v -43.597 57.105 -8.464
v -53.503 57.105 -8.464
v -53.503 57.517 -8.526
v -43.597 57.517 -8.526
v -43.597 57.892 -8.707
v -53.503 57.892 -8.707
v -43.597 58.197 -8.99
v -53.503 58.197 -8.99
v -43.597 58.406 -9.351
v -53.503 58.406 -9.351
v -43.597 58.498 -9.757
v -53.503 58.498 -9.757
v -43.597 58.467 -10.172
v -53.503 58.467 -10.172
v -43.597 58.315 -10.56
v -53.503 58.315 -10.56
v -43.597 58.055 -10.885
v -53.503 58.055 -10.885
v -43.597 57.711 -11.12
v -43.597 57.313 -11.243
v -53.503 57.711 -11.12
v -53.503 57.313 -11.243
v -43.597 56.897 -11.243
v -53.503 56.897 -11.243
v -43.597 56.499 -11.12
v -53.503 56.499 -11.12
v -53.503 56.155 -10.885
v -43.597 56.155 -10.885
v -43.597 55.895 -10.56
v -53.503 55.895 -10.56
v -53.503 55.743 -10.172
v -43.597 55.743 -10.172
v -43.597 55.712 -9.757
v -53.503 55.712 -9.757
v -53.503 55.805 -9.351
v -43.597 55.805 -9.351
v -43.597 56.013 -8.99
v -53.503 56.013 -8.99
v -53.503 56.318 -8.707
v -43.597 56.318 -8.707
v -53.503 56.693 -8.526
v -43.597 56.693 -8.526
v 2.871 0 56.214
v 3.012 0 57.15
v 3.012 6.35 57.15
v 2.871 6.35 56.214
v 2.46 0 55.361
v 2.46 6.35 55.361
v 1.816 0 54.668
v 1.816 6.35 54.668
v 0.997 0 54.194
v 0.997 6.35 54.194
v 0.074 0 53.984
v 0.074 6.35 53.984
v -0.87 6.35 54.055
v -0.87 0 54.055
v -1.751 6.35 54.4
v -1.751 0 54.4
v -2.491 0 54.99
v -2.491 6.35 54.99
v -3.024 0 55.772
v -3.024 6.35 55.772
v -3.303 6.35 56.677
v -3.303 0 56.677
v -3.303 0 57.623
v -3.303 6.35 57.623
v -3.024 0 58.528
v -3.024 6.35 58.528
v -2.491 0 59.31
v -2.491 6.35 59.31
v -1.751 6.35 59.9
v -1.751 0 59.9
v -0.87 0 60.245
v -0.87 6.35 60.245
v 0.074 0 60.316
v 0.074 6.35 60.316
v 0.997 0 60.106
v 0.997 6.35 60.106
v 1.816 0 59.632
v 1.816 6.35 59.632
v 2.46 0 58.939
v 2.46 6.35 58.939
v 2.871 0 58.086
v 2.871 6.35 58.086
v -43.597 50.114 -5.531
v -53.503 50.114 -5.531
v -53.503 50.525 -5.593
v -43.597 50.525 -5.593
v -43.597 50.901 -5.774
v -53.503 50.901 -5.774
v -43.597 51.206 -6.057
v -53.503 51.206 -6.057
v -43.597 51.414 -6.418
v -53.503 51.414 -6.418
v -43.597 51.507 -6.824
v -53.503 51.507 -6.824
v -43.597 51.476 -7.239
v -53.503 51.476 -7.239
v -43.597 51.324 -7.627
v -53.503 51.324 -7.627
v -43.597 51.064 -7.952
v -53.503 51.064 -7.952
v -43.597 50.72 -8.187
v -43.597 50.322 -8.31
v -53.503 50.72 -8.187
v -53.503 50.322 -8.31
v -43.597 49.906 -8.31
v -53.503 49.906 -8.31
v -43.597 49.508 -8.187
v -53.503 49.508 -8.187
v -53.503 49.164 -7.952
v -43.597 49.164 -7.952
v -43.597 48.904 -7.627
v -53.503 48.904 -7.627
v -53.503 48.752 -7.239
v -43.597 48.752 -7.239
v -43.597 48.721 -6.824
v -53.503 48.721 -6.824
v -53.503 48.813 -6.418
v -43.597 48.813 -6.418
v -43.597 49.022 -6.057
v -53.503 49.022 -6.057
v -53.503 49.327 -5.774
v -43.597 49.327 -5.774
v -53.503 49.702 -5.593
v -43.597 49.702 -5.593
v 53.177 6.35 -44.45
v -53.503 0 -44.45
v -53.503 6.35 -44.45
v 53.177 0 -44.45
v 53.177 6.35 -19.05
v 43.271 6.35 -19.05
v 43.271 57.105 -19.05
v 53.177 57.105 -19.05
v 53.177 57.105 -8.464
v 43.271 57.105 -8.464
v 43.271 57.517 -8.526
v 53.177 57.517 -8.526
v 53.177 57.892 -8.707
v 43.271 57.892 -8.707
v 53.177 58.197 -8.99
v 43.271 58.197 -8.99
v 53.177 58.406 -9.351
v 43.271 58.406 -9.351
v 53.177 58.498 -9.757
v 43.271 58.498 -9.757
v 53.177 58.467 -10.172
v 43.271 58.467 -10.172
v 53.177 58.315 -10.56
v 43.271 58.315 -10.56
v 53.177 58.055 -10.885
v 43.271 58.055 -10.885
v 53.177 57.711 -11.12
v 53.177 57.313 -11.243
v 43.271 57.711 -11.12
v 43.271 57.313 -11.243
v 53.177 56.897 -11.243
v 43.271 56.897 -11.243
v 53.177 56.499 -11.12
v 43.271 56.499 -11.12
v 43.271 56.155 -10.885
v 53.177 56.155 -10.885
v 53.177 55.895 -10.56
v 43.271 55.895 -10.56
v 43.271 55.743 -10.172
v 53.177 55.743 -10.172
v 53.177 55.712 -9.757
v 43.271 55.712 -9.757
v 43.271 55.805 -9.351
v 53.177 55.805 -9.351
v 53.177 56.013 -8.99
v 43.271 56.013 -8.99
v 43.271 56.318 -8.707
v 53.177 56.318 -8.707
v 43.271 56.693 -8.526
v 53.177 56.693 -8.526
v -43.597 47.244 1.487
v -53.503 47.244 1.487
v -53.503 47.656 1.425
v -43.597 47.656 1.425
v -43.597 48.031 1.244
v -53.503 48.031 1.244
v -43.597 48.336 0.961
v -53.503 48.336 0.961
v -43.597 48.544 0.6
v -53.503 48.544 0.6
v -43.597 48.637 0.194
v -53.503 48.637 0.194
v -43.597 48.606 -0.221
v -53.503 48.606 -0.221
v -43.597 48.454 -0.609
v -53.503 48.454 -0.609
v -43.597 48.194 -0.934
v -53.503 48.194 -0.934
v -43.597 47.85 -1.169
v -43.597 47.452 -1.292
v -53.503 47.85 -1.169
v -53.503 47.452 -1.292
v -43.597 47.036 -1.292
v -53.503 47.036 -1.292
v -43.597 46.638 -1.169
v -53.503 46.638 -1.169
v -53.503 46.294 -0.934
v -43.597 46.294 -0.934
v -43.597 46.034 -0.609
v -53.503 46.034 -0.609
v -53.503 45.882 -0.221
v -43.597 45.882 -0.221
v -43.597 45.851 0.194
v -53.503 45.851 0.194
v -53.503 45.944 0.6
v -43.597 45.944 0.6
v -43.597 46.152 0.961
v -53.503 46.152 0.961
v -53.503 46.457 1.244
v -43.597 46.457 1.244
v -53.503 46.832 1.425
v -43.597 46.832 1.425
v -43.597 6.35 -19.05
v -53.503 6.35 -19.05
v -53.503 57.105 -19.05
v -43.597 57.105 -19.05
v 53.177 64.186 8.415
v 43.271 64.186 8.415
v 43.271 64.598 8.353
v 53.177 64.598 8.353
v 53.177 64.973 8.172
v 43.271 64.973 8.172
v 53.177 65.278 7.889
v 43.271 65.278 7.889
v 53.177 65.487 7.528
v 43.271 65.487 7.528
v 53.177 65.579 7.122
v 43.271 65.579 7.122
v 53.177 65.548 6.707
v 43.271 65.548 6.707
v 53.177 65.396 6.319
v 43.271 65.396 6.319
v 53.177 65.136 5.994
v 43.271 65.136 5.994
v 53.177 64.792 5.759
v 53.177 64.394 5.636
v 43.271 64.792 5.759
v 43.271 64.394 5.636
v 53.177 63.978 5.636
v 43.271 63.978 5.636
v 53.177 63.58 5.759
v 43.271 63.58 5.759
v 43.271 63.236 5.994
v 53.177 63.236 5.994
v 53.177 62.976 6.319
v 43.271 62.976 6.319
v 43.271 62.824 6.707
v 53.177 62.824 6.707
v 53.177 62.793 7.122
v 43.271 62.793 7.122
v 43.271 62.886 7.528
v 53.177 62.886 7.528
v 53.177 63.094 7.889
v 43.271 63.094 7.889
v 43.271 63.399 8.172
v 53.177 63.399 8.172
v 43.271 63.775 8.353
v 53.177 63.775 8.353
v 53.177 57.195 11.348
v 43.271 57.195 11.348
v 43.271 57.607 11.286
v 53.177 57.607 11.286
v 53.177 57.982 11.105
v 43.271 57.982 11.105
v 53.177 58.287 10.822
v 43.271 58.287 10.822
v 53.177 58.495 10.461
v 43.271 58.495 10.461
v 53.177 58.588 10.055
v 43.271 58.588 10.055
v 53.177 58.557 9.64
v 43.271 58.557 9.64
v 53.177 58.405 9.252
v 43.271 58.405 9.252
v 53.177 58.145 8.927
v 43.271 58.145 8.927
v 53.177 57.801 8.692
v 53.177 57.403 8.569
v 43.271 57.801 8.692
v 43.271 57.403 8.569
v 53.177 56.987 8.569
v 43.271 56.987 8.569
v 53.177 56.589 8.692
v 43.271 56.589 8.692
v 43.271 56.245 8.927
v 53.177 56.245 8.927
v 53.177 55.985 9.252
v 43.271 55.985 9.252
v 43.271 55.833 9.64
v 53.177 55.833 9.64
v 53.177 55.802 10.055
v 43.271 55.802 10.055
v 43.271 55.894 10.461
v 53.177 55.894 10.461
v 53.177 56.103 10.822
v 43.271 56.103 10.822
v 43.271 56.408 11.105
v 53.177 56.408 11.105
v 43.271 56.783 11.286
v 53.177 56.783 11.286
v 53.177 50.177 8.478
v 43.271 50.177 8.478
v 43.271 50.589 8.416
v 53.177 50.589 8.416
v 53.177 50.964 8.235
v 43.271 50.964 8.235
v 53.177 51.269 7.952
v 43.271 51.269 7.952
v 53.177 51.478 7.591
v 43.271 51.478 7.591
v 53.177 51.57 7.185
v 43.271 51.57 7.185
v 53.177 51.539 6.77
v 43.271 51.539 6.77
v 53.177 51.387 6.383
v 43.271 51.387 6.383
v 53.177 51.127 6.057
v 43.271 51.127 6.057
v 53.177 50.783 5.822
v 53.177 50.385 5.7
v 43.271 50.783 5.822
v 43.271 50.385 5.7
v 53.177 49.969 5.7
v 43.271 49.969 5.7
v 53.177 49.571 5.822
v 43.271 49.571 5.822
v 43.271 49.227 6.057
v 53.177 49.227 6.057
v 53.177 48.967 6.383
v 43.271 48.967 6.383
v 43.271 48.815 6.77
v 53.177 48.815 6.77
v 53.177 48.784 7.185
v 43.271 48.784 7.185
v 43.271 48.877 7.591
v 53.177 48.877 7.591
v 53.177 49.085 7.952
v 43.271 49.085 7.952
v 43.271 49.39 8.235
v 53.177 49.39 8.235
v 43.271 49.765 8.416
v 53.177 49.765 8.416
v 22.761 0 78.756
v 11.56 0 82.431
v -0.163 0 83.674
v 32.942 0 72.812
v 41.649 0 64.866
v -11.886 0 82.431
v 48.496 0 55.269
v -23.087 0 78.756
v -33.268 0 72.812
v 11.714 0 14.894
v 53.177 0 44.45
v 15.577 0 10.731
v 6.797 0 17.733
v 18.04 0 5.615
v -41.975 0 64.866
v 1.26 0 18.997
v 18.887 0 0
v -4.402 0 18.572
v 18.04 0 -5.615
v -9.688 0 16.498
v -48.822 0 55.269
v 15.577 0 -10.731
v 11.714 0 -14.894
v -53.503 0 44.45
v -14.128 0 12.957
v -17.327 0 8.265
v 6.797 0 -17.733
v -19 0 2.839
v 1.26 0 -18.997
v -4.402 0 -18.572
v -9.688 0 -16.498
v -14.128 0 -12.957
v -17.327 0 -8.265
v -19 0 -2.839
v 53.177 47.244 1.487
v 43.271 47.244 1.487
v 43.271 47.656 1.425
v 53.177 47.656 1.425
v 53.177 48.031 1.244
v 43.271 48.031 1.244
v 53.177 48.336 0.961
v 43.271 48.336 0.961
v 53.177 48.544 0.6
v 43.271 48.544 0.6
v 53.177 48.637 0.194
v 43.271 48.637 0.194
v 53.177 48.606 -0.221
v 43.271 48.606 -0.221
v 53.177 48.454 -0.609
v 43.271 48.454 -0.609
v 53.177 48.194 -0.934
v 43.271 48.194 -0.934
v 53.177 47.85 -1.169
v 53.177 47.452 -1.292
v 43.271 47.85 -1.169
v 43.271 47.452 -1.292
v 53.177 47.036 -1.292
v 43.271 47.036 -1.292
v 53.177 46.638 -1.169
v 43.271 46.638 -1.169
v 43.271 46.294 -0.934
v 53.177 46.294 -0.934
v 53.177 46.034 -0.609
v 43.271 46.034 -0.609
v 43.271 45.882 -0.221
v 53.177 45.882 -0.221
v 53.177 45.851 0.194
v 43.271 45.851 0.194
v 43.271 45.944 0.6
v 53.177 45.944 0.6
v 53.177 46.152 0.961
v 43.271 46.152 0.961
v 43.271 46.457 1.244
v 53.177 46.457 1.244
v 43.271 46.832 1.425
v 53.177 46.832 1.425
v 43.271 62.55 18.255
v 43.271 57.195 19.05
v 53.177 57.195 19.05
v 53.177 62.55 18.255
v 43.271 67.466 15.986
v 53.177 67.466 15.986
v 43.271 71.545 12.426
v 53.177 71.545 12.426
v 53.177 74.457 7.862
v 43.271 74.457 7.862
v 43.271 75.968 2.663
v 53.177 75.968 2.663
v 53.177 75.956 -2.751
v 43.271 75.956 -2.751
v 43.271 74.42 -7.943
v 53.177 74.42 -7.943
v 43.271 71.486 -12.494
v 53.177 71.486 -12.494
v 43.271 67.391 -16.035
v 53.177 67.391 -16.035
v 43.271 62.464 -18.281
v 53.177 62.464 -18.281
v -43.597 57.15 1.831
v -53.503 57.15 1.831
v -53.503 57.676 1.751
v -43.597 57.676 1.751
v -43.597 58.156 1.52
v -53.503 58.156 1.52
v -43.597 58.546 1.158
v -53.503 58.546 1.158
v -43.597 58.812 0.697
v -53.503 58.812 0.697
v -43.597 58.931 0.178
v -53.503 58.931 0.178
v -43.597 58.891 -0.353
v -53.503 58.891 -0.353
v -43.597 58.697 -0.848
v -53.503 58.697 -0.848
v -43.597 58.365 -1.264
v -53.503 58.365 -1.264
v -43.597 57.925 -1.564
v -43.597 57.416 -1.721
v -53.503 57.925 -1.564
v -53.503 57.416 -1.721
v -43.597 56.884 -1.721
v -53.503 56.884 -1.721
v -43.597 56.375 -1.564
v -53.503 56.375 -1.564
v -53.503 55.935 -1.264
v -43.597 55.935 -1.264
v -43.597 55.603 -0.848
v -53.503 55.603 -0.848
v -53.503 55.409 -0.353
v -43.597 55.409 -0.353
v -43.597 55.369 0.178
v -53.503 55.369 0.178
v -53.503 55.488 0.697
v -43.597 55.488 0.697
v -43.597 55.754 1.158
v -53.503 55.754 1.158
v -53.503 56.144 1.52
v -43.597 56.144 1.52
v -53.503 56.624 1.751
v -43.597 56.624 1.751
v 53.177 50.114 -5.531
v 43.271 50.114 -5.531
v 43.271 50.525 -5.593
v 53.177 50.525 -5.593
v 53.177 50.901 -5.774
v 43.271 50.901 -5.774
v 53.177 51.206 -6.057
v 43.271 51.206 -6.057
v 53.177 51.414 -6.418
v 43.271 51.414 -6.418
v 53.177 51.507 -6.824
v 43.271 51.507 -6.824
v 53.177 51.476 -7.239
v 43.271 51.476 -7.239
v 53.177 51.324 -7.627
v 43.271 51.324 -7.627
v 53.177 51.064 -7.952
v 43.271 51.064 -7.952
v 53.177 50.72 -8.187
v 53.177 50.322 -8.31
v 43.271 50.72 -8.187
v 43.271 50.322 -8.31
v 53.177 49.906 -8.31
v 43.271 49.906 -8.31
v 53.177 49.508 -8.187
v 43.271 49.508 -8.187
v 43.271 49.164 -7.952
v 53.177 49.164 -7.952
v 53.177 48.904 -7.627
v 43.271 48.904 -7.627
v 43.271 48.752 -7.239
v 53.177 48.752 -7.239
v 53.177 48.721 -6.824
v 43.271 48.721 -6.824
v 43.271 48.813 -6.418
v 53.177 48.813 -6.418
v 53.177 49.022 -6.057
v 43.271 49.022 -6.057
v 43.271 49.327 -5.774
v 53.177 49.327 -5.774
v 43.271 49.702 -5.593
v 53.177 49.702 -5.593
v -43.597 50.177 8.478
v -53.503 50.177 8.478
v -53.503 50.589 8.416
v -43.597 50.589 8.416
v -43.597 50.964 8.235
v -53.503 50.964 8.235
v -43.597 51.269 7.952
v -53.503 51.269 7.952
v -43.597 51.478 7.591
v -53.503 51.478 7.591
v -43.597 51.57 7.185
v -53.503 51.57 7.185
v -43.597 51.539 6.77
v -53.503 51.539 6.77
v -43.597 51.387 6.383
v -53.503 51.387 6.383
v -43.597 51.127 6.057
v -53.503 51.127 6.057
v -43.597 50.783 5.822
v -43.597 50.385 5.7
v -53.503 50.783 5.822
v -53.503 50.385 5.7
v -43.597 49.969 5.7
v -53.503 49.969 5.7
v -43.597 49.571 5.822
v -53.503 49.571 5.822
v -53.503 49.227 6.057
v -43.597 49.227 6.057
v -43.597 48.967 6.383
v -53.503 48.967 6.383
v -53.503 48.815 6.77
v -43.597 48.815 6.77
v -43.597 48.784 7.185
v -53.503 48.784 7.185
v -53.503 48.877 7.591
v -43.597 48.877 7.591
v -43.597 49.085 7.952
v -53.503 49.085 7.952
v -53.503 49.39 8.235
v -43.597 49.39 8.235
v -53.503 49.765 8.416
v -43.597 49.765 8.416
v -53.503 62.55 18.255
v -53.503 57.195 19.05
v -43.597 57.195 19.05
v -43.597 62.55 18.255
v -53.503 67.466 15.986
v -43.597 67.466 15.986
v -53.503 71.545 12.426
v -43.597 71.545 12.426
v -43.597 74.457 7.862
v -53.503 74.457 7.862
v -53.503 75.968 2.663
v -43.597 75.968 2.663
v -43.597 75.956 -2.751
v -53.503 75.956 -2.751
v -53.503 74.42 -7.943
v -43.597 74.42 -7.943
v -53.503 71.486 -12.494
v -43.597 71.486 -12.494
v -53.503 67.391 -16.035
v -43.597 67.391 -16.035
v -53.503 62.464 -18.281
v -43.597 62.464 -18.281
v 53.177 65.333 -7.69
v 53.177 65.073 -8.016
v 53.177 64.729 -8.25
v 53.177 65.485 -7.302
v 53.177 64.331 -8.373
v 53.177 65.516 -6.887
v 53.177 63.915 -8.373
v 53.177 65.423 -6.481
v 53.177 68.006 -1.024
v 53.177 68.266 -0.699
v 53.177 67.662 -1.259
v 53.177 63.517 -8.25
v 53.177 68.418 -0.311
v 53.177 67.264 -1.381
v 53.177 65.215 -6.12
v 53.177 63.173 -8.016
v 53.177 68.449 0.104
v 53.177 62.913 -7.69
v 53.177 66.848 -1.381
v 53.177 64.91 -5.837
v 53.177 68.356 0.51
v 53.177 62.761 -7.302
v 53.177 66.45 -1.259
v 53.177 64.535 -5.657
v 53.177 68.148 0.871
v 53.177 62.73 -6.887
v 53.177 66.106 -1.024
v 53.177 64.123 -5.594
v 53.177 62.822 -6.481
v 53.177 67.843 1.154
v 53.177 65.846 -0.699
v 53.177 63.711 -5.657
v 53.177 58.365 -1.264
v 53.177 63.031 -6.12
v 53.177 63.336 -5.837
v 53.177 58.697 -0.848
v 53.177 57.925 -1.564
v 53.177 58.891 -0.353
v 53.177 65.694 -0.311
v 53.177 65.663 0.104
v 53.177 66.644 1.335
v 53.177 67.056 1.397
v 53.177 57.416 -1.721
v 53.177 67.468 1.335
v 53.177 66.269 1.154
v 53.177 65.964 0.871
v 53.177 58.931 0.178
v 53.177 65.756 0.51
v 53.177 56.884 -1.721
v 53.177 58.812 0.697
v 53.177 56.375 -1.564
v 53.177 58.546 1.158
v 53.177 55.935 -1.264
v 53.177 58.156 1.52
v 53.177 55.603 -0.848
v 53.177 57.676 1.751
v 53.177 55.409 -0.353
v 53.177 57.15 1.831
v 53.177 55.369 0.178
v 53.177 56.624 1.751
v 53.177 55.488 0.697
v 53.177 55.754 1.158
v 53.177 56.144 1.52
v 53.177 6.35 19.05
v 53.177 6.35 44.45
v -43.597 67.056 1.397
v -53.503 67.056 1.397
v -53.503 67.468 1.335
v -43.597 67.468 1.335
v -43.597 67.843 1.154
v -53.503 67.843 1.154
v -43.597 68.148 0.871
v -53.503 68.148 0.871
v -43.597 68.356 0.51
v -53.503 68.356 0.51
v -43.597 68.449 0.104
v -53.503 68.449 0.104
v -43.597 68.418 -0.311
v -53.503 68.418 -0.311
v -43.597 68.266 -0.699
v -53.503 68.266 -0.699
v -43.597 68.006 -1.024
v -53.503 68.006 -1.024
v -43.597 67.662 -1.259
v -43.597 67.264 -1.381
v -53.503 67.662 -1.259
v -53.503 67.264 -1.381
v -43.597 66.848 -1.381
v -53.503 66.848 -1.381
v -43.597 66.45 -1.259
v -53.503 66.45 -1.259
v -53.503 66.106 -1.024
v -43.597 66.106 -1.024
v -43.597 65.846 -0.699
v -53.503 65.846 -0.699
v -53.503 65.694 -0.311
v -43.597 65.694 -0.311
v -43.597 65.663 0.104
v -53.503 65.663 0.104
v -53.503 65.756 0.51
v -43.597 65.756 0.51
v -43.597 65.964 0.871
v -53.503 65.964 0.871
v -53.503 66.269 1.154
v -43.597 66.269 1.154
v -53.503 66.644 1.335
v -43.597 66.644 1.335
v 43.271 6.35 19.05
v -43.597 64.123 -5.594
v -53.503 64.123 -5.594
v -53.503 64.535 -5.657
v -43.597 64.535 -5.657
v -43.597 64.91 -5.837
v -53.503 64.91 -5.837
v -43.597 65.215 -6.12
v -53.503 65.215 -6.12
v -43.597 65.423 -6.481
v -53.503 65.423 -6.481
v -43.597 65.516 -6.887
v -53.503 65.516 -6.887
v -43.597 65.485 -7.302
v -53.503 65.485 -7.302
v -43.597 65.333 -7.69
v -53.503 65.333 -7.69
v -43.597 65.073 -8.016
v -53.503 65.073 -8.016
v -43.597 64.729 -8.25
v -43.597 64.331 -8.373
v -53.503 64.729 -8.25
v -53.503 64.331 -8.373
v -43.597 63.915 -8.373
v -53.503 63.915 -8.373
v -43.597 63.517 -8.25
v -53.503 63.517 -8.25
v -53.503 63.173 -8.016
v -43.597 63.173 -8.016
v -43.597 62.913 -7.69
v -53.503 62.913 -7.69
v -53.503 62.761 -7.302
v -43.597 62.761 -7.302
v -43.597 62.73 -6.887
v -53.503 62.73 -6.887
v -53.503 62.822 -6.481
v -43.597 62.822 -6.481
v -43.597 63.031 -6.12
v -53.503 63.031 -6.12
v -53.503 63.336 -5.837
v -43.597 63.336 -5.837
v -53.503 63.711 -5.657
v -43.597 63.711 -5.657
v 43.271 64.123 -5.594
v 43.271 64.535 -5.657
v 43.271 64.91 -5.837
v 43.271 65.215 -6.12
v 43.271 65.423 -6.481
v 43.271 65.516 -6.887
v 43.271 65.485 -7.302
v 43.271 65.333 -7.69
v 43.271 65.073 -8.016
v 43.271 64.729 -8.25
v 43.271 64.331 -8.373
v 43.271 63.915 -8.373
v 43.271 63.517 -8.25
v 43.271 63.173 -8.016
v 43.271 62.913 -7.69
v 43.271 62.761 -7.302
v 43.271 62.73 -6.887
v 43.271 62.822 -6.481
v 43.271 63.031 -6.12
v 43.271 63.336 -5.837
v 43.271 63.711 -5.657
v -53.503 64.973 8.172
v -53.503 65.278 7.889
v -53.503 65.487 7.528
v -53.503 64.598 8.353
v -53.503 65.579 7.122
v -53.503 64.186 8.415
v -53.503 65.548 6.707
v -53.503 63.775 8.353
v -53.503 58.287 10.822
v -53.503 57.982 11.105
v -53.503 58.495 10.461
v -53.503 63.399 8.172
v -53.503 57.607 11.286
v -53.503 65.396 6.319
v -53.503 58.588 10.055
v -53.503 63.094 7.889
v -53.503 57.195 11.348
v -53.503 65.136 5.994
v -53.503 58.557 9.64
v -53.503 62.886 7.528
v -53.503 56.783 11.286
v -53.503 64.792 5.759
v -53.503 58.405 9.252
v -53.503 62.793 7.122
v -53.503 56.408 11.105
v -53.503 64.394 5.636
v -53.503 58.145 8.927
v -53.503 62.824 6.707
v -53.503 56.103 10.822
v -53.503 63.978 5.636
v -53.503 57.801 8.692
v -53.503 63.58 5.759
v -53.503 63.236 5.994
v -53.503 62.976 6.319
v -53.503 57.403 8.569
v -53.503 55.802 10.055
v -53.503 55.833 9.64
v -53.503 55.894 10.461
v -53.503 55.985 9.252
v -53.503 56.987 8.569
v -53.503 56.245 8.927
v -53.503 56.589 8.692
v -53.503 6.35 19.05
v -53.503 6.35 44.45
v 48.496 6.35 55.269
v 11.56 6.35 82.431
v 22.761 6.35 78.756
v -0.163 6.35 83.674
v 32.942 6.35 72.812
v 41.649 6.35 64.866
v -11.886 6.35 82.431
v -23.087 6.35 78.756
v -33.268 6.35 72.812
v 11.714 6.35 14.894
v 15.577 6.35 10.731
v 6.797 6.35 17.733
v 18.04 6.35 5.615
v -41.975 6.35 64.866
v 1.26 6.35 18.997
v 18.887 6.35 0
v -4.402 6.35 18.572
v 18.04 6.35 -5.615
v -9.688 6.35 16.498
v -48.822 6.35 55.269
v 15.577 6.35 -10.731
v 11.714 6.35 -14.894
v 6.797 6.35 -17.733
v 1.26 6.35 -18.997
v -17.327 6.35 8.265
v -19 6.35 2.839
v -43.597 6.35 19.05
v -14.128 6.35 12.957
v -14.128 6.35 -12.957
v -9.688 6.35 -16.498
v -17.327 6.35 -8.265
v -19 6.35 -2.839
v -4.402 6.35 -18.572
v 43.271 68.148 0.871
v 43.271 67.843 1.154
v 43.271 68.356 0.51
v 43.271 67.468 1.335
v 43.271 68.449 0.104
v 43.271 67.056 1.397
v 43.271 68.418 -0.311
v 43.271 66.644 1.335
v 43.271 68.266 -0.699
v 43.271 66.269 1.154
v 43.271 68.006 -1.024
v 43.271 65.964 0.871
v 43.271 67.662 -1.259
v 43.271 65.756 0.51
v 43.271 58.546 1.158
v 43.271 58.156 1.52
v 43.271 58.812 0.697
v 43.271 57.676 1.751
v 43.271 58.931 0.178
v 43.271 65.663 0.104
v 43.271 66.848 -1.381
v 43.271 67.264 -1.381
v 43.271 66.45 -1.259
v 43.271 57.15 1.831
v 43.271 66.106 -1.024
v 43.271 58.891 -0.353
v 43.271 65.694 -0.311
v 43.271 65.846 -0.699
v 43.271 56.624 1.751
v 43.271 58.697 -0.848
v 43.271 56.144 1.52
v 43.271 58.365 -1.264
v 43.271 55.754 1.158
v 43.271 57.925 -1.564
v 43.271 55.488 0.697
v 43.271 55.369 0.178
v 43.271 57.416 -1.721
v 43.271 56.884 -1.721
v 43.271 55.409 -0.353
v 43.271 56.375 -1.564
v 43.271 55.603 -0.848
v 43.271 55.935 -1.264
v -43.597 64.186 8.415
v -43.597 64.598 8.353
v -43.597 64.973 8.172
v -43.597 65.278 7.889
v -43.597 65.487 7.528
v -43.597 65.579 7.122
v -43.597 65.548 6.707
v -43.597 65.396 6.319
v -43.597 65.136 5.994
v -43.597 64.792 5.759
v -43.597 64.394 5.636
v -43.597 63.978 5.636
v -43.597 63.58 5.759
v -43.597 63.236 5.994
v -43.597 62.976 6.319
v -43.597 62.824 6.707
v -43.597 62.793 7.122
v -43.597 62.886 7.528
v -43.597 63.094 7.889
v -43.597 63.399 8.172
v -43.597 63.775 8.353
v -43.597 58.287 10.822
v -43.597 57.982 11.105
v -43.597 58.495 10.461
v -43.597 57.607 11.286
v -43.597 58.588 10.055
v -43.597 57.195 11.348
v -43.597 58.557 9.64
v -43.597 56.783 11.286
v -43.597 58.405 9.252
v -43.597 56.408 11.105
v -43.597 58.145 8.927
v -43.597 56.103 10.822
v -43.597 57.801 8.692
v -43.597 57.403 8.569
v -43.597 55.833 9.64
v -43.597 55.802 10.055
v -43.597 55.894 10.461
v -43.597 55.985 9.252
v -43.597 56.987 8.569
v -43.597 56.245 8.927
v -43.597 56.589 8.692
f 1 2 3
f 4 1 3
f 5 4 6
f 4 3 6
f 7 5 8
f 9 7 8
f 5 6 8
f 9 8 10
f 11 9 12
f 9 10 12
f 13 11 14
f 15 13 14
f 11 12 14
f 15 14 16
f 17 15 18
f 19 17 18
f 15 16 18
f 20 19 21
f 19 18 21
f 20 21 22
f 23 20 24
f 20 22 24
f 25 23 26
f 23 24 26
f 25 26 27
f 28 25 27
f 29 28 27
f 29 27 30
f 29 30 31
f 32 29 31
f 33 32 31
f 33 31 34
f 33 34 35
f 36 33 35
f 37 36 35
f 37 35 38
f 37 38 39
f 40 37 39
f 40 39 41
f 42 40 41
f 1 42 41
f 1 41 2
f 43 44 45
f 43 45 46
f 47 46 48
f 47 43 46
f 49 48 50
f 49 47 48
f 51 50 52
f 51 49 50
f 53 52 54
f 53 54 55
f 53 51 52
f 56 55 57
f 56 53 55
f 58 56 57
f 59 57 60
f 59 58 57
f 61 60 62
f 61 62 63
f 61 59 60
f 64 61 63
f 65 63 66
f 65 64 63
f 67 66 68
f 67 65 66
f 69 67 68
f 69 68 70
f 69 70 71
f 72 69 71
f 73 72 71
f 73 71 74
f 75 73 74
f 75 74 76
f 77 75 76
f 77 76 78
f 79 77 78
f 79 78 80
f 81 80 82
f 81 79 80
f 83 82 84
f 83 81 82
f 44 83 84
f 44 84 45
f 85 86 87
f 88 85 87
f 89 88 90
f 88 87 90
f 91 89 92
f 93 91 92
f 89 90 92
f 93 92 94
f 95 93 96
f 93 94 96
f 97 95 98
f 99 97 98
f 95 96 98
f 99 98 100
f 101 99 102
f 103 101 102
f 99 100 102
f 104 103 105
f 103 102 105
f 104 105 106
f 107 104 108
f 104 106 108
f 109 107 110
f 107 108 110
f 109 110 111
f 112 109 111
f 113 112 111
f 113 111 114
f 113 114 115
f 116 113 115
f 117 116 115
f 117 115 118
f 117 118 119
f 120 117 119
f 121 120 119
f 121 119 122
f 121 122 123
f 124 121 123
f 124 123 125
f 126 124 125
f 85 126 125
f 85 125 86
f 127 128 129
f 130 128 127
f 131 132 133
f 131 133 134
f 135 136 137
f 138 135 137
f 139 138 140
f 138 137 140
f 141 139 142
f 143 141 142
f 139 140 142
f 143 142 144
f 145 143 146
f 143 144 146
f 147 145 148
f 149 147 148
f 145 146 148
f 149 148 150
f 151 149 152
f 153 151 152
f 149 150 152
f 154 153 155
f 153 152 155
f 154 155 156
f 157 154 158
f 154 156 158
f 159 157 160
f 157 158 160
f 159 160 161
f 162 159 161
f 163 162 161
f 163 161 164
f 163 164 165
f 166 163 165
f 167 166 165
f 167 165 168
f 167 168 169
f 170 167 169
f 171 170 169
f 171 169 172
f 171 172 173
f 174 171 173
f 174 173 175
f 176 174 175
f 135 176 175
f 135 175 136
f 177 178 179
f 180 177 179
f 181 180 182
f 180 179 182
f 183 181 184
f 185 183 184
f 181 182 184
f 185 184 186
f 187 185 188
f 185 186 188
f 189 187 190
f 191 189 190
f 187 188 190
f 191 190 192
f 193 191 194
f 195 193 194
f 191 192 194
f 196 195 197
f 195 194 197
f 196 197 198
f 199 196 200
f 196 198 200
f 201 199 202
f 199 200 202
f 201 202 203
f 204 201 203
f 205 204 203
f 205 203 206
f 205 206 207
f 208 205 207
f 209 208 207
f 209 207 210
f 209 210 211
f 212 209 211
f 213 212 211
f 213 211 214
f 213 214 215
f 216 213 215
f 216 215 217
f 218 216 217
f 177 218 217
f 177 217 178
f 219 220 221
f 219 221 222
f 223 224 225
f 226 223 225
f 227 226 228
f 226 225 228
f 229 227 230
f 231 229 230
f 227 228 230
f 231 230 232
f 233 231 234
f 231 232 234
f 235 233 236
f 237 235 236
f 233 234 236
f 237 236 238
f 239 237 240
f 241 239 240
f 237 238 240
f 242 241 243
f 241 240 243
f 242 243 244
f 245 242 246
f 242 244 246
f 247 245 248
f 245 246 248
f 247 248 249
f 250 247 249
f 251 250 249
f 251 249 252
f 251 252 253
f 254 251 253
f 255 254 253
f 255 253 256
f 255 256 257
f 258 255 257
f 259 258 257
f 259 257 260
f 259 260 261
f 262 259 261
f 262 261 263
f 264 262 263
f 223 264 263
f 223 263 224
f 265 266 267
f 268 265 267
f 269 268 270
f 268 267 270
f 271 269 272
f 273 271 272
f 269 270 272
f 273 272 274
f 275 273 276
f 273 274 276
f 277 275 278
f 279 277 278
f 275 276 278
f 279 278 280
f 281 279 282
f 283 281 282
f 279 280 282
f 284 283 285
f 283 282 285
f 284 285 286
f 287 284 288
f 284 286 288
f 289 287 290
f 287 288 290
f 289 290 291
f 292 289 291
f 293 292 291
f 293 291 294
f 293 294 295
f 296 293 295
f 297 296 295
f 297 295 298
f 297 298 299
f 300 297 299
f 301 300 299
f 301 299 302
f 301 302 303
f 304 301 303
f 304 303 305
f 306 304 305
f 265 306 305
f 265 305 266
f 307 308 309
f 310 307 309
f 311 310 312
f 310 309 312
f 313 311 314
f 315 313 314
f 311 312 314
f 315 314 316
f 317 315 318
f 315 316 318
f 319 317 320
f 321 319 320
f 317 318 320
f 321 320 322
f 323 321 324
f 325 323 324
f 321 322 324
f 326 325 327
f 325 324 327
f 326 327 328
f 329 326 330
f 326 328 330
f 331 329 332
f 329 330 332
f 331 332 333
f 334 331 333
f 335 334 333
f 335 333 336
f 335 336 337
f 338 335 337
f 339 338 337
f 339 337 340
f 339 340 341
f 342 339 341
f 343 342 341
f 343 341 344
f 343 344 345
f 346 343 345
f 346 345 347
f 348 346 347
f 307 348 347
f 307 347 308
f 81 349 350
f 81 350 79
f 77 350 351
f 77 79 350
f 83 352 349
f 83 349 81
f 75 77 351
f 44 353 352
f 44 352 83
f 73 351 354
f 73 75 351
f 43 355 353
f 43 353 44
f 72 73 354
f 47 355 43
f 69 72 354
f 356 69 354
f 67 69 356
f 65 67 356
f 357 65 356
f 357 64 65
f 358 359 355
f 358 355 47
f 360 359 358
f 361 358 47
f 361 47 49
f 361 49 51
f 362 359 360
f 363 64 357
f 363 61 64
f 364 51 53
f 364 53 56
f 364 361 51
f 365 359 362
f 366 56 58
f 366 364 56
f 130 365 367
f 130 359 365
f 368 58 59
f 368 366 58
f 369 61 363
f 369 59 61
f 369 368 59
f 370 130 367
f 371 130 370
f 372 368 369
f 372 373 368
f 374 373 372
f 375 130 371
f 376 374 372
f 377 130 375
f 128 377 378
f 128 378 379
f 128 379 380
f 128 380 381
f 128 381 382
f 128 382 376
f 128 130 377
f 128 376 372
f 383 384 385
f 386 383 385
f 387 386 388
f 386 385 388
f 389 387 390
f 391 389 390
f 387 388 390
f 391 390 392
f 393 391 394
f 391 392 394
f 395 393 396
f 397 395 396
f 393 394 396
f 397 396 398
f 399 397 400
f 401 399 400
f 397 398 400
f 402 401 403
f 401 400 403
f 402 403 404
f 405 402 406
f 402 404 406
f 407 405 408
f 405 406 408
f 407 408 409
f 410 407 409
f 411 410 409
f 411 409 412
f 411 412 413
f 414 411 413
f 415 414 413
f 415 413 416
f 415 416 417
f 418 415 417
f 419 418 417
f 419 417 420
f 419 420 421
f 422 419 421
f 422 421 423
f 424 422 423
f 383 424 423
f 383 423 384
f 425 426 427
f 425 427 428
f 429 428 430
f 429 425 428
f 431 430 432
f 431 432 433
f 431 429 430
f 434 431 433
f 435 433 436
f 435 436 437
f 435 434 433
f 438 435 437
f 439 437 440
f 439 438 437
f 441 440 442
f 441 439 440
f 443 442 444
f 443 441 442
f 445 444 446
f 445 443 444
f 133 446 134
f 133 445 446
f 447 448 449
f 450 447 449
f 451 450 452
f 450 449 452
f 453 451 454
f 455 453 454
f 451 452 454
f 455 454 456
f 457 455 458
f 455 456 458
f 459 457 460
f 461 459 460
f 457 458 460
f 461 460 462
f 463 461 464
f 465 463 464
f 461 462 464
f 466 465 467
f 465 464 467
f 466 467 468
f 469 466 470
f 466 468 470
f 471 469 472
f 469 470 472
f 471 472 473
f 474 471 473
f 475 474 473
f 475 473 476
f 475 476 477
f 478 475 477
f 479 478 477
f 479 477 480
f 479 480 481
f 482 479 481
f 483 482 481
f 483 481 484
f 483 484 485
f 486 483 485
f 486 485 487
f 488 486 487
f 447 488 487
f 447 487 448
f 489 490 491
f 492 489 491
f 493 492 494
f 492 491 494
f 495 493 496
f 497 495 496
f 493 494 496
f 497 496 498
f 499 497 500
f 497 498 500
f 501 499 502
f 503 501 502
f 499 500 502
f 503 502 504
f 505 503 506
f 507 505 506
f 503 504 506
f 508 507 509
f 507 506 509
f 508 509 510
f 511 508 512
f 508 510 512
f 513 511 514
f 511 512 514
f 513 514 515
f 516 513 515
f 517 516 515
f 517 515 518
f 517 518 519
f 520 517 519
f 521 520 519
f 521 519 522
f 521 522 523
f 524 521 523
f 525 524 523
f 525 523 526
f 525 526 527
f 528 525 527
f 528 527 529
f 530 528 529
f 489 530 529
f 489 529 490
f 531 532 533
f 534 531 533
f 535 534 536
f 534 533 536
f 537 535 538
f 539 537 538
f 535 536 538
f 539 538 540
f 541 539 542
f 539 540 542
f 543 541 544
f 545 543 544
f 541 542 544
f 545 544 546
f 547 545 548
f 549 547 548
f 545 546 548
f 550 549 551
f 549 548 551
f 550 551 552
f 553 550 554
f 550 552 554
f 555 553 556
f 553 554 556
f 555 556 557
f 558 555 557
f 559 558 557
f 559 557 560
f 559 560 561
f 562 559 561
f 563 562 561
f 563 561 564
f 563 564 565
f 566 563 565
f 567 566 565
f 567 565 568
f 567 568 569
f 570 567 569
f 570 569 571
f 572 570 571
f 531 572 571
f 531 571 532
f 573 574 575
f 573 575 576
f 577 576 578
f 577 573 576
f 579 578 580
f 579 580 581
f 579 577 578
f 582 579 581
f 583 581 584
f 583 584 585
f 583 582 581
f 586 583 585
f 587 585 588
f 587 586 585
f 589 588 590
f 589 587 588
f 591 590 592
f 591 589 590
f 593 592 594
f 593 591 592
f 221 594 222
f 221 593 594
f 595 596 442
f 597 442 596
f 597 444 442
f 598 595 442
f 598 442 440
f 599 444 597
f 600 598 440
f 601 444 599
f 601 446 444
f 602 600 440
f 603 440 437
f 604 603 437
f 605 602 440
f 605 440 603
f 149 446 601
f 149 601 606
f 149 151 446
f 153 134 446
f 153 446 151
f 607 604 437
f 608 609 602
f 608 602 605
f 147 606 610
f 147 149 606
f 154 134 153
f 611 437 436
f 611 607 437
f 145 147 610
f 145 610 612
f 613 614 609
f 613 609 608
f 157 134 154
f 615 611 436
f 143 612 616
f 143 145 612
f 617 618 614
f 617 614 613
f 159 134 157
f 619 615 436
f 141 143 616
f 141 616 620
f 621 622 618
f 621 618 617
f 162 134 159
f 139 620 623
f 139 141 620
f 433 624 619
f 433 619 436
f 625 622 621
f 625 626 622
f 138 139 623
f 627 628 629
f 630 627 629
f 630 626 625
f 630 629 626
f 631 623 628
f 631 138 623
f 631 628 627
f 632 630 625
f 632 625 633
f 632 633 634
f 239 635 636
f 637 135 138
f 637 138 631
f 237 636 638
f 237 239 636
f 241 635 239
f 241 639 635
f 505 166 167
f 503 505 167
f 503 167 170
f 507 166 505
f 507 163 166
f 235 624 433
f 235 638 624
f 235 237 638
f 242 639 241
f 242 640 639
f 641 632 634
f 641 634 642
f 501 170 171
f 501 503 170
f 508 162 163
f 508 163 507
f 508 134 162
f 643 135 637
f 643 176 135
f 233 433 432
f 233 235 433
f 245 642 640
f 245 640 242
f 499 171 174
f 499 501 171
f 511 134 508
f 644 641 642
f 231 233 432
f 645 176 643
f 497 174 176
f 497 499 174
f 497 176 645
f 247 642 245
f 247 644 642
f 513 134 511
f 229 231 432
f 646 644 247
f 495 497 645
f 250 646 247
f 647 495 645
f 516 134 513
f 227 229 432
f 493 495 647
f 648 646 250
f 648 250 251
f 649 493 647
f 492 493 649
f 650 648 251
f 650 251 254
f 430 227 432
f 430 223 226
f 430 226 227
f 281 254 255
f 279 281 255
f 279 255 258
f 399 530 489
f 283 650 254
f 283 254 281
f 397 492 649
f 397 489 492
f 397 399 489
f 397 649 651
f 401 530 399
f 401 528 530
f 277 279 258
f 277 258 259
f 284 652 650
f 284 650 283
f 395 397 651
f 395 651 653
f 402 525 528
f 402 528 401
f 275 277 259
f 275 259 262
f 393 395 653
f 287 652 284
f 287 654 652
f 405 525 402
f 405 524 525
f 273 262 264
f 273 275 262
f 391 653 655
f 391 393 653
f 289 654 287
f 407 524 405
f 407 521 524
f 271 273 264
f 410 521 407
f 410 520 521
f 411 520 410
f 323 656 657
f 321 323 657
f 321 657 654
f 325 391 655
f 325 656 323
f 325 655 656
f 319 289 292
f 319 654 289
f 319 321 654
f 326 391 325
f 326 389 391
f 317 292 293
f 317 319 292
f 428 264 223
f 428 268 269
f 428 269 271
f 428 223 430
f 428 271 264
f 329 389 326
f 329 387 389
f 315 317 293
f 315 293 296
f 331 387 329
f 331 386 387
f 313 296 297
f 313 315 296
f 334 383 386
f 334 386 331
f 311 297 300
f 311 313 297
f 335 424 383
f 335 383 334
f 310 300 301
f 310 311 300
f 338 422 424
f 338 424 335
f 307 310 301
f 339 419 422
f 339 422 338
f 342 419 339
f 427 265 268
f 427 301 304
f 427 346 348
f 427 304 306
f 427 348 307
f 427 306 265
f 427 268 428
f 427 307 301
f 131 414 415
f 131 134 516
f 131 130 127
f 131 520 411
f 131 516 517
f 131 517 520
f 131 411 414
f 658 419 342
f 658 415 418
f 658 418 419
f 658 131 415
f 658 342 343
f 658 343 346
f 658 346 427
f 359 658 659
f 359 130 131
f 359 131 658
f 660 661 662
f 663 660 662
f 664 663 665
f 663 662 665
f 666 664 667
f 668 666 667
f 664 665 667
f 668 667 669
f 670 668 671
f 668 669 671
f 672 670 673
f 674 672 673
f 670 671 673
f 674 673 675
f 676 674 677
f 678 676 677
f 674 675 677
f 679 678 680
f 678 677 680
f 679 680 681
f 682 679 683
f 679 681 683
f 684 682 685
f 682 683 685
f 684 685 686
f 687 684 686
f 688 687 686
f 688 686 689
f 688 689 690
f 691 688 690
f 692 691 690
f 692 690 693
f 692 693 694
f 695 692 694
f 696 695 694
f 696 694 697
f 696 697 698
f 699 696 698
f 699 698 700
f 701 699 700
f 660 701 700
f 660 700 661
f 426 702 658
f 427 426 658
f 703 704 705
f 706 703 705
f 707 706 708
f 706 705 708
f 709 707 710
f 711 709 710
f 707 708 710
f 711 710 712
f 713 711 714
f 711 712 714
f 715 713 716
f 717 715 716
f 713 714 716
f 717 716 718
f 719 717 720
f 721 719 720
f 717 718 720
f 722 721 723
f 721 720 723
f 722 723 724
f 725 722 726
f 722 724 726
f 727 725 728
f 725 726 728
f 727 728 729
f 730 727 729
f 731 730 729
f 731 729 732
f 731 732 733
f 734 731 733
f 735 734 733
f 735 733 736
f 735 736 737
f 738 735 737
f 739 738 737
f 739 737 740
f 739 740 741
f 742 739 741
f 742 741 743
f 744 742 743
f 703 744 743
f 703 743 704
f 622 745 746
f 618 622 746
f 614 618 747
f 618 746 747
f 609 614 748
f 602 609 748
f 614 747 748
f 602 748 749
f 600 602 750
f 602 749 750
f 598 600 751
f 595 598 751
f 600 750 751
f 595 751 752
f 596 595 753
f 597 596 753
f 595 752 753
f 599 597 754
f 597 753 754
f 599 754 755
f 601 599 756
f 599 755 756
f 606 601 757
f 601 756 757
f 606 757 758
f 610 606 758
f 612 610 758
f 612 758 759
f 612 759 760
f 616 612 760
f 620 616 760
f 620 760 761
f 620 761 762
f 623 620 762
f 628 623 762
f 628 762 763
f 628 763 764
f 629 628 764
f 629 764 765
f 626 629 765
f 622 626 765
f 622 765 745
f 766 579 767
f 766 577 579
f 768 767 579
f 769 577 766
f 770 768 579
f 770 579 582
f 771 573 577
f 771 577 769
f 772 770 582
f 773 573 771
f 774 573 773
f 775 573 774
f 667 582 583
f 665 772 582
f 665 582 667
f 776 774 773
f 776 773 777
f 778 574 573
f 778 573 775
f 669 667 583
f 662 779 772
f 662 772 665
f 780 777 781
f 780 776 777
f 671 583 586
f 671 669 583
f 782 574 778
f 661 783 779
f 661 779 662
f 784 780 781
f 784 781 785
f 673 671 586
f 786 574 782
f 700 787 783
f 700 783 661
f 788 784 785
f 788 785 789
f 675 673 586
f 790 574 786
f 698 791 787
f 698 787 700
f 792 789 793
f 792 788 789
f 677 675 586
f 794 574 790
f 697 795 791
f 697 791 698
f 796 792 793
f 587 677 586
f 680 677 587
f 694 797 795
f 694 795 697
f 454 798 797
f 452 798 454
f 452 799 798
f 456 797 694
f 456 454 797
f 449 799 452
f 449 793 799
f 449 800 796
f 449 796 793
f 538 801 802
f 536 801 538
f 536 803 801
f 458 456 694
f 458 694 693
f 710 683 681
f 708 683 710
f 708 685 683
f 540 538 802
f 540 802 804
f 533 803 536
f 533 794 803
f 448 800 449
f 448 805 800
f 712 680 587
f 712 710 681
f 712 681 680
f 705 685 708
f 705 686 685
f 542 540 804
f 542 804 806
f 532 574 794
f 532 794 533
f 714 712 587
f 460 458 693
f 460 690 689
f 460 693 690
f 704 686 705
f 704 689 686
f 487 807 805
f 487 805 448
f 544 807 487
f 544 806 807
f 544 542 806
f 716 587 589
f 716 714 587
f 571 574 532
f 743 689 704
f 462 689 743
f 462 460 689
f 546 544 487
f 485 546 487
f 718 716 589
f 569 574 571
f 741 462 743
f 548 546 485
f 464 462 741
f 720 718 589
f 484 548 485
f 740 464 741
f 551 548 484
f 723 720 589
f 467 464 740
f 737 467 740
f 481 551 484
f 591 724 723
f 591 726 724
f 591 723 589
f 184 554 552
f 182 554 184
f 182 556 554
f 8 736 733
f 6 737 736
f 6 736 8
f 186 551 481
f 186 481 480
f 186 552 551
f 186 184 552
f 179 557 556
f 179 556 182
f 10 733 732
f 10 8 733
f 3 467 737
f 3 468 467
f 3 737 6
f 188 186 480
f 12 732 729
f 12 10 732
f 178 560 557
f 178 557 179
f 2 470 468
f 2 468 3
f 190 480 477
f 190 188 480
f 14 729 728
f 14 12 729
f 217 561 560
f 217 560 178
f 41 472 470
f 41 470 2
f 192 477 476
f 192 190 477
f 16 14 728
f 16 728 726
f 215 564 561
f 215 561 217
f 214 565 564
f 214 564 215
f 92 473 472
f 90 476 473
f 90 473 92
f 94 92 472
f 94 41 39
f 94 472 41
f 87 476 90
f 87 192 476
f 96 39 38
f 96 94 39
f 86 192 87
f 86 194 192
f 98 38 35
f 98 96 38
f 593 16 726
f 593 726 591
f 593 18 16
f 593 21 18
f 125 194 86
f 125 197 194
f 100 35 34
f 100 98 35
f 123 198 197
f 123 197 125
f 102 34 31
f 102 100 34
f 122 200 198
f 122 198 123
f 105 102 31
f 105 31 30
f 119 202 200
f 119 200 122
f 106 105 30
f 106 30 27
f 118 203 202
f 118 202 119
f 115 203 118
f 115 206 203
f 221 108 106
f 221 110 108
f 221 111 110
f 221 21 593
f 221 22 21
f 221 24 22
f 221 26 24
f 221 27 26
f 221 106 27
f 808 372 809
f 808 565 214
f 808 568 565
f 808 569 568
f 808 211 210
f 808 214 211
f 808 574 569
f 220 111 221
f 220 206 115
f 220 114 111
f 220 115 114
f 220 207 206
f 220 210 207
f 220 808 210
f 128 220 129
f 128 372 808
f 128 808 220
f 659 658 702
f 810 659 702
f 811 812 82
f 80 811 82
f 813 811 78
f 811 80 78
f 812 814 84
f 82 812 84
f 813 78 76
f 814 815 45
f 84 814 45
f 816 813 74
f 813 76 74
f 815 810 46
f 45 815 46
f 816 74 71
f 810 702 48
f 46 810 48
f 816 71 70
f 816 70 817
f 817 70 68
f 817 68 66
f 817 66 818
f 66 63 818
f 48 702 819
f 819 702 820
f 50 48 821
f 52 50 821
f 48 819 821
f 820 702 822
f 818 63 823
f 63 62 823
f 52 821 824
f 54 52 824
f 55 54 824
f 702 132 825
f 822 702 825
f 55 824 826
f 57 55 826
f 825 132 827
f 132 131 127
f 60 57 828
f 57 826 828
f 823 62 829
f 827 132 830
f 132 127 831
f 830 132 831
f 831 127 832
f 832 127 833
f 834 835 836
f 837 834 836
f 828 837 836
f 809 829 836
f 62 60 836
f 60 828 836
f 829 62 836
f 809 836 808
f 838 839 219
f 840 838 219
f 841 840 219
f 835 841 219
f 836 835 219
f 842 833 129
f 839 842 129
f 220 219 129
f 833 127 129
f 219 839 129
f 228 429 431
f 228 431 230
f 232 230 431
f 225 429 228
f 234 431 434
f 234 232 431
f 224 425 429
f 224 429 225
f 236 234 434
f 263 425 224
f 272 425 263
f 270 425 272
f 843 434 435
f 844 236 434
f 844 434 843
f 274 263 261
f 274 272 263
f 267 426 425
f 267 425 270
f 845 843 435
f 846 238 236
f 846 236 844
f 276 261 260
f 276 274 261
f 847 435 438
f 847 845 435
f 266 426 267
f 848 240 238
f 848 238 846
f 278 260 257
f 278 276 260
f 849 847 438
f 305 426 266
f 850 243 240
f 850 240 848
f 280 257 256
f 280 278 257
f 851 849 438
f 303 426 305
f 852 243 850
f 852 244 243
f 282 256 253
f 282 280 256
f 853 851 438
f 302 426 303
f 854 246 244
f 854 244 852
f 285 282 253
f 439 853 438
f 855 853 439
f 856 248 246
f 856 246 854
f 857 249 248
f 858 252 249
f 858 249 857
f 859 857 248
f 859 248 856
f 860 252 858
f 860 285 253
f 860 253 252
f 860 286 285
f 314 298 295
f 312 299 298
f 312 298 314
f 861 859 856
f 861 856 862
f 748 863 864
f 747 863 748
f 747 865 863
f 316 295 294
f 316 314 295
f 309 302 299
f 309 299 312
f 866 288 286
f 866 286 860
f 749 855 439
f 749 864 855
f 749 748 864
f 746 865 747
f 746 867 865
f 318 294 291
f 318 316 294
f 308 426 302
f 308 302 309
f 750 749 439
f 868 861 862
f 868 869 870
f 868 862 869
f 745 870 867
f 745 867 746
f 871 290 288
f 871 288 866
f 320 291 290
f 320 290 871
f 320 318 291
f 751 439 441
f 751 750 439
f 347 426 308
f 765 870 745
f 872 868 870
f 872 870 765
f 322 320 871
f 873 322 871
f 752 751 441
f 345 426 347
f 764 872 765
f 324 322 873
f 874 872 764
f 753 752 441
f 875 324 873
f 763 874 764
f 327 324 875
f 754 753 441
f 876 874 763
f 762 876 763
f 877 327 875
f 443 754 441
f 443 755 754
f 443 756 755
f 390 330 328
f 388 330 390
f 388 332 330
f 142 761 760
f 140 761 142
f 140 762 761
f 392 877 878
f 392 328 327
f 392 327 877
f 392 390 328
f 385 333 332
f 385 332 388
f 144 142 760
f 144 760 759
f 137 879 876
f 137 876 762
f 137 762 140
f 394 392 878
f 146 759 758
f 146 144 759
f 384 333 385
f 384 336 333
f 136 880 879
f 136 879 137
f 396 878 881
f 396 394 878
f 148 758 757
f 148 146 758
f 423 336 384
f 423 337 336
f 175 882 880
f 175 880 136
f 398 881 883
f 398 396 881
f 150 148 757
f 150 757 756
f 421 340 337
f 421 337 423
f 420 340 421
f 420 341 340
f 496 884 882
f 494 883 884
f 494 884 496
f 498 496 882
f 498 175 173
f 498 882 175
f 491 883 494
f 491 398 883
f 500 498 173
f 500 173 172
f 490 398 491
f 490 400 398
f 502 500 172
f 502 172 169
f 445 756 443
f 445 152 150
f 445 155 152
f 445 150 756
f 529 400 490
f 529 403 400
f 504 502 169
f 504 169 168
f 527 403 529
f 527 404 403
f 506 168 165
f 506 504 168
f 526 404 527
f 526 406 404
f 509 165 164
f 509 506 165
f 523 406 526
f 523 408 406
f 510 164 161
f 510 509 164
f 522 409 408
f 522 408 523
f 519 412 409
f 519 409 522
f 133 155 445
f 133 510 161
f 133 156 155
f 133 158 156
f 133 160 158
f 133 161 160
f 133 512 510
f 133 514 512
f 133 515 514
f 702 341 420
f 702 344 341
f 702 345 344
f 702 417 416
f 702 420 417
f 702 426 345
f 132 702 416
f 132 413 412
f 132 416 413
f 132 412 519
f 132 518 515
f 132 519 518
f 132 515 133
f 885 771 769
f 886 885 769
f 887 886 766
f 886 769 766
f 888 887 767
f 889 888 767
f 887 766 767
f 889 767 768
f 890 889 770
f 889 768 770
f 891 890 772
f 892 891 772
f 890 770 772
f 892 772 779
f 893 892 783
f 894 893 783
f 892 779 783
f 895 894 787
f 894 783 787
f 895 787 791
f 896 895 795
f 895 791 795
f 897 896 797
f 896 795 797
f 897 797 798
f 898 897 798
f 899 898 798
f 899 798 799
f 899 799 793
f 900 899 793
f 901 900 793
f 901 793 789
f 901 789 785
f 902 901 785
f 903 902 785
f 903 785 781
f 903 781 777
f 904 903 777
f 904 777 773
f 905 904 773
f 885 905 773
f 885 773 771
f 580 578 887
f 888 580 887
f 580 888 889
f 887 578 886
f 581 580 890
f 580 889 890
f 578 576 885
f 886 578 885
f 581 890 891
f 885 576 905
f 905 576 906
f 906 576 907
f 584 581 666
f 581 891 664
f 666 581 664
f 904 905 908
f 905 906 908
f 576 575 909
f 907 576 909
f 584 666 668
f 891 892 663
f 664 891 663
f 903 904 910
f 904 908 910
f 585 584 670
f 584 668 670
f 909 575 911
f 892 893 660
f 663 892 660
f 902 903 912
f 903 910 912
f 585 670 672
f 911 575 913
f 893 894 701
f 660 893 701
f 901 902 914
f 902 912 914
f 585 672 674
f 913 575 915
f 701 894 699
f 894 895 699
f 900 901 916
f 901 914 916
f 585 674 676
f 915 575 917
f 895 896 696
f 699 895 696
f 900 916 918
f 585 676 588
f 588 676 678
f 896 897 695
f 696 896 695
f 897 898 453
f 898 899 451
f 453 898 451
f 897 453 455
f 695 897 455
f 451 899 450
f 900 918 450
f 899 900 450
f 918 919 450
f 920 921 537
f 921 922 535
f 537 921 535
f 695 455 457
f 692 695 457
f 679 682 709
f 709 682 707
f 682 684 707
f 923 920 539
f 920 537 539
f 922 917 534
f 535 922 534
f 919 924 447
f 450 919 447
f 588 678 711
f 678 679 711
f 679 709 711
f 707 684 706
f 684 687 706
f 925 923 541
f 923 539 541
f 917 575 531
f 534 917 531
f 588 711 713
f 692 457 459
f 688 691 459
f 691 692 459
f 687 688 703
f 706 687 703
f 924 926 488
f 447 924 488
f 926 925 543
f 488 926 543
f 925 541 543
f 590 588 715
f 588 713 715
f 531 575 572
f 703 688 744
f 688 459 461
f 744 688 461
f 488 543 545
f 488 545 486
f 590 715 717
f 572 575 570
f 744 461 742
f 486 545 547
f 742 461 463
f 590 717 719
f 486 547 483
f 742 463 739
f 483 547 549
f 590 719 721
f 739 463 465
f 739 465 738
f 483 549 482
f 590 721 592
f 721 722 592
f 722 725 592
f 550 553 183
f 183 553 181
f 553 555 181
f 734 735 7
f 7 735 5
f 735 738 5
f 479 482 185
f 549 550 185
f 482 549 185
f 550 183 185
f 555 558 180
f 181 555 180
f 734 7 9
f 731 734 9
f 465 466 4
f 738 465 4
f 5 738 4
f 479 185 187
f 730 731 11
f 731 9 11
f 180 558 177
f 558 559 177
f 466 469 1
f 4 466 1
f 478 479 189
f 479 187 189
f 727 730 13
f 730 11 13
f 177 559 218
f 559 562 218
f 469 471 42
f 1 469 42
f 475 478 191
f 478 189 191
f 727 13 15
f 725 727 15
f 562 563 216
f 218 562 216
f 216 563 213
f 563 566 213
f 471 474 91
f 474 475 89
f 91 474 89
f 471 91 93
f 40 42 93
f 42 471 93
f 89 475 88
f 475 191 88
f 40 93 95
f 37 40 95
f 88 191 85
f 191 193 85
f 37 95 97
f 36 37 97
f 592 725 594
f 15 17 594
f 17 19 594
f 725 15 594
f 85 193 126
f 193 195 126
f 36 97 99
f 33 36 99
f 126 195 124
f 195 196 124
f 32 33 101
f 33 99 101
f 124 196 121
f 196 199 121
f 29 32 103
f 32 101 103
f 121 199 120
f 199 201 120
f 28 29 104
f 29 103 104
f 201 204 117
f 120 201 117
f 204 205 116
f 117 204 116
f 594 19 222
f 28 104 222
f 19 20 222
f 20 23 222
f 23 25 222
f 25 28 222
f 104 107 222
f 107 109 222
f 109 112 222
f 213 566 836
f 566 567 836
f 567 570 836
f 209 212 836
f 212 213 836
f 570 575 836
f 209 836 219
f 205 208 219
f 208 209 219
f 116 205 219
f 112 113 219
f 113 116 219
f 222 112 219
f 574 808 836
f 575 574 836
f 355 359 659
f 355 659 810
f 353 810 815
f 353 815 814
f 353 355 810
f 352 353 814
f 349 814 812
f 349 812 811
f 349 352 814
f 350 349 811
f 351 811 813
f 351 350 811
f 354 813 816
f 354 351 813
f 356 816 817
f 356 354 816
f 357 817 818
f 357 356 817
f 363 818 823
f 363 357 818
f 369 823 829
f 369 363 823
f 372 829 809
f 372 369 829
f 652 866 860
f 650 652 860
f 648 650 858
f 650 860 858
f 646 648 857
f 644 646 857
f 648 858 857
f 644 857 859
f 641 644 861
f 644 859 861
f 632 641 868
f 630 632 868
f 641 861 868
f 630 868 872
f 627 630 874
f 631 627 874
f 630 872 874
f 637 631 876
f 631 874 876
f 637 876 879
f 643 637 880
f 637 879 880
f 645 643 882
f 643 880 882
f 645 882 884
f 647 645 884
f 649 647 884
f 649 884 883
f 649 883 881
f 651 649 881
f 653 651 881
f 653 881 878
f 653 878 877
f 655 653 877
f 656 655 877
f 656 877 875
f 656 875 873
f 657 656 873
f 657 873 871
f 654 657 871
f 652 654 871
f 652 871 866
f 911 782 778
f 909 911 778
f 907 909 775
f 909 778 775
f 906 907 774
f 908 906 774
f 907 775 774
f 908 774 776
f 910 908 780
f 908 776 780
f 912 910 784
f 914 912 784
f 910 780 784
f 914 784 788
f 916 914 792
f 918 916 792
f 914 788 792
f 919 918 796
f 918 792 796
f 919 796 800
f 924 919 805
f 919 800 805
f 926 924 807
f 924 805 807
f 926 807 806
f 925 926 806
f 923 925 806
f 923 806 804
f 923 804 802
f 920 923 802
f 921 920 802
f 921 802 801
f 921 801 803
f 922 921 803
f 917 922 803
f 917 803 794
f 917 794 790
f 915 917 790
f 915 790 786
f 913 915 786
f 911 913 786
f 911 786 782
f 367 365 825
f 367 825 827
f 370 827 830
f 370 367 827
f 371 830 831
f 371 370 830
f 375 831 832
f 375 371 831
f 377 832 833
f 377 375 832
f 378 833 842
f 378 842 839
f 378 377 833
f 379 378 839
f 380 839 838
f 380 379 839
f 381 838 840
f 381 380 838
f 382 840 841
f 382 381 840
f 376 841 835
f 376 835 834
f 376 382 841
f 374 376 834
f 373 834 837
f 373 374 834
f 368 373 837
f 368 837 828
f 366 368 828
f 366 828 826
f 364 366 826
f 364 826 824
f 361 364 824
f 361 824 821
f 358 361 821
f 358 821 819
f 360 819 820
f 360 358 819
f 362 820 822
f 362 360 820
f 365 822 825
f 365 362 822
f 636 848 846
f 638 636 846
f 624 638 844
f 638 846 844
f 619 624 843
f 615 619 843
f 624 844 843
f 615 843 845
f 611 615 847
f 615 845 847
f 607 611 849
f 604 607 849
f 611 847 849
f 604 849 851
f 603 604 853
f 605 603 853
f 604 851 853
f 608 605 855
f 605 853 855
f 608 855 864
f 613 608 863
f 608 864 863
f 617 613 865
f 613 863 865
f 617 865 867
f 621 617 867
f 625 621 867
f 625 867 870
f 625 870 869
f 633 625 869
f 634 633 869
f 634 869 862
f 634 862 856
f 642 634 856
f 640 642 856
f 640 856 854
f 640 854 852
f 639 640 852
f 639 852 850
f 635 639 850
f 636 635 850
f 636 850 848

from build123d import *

# Parameters (mm, degrees)
SKETCH1_R           = 19.05
SKETCH1_R_2         = 3.175
BOSS_EXTRUDE1_DEPTH = 6.35
SKETCH6_W           = 9.906
SKETCH6_H           = 38.1
BOSS_EXTRUDE2_DEPTH = 76.2
SKETCH7_R           = 1.397
SKETCH7_R_2         = 1.7859375
CUT_EXTRUDE1_DEPTH  = 107.68


with BuildPart() as part:
    # Sketch1 → Boss-Extrude1 (new body)
    with BuildSketch(Plane(origin=(0, 0, 0), x_dir=(1, 0, 0), z_dir=(0, 1, 0))):
        with BuildLine():
            Line((-53.503176773, 44.45), (53.176823227, 44.45))
            Line((53.176823227, 44.45), (53.176823227, -44.45))
            ThreePointArc((53.176823227, -44.45), (-0.163176773, -83.674106148), (-53.503176773, -44.45))
            Line((-53.503176773, -44.45), (-53.503176773, 44.45))
        make_face()
        with Locations((-0.163176773, 0)):
            Circle(SKETCH1_R, mode=Mode.SUBTRACT)
        with Locations((-0.163176773, -57.15)):
            Circle(SKETCH1_R_2, mode=Mode.SUBTRACT)
    extrude(amount=BOSS_EXTRUDE1_DEPTH)

    # Sketch6 → Boss-Extrude2 (add)
    with BuildSketch(Plane(origin=(0, 6.35, 0), x_dir=(1, 0, 0), z_dir=(0, 1, 0))):
        with Locations((-48.550176773, 0)):
            Rectangle(SKETCH6_W, SKETCH6_H)
        with Locations((48.223823227, 0)):
            Rectangle(SKETCH6_W, SKETCH6_H)
    extrude(amount=BOSS_EXTRUDE2_DEPTH)

    # Sketch7 → Cut-Extrude1 (cut, through all)
    with BuildSketch(Plane.ZY.offset(53.503176773)):
        with Locations((-6.991480211, 64.122926346)):
            Circle(SKETCH7_R)
        with Locations((0, 67.056)):
            Circle(SKETCH7_R)
        with Locations((7.017719338, 64.186273203)):
            Circle(SKETCH7_R)
        with Locations((9.950792993, 57.194792993)):
            Circle(SKETCH7_R)
        with Locations((7.081066196, 50.177073654)):
            Circle(SKETCH7_R)
        with Locations((0.089585985, 47.244)):
            Circle(SKETCH7_R)
        with Locations((-6.928133353, 50.113726797)):
            Circle(SKETCH7_R)
        with Locations((-9.861207007, 57.105207007)):
            Circle(SKETCH7_R)
        with Locations((0.044792993, 57.15)):
            Circle(SKETCH7_R_2)
        with BuildLine():
            Line((-19.05, 57.105207007), (-19.05, 82.55))
            Line((-19.05, 82.55), (19.05, 82.55))
            Line((19.05, 82.55), (19.05, 57.194792993))
            ThreePointArc((19.05, 57.194792993), (-0.044687793, 76.155259669), (-19.05, 57.105207007))
        make_face()
    extrude(amount=-CUT_EXTRUDE1_DEPTH, mode=Mode.SUBTRACT)


solid = part.part
